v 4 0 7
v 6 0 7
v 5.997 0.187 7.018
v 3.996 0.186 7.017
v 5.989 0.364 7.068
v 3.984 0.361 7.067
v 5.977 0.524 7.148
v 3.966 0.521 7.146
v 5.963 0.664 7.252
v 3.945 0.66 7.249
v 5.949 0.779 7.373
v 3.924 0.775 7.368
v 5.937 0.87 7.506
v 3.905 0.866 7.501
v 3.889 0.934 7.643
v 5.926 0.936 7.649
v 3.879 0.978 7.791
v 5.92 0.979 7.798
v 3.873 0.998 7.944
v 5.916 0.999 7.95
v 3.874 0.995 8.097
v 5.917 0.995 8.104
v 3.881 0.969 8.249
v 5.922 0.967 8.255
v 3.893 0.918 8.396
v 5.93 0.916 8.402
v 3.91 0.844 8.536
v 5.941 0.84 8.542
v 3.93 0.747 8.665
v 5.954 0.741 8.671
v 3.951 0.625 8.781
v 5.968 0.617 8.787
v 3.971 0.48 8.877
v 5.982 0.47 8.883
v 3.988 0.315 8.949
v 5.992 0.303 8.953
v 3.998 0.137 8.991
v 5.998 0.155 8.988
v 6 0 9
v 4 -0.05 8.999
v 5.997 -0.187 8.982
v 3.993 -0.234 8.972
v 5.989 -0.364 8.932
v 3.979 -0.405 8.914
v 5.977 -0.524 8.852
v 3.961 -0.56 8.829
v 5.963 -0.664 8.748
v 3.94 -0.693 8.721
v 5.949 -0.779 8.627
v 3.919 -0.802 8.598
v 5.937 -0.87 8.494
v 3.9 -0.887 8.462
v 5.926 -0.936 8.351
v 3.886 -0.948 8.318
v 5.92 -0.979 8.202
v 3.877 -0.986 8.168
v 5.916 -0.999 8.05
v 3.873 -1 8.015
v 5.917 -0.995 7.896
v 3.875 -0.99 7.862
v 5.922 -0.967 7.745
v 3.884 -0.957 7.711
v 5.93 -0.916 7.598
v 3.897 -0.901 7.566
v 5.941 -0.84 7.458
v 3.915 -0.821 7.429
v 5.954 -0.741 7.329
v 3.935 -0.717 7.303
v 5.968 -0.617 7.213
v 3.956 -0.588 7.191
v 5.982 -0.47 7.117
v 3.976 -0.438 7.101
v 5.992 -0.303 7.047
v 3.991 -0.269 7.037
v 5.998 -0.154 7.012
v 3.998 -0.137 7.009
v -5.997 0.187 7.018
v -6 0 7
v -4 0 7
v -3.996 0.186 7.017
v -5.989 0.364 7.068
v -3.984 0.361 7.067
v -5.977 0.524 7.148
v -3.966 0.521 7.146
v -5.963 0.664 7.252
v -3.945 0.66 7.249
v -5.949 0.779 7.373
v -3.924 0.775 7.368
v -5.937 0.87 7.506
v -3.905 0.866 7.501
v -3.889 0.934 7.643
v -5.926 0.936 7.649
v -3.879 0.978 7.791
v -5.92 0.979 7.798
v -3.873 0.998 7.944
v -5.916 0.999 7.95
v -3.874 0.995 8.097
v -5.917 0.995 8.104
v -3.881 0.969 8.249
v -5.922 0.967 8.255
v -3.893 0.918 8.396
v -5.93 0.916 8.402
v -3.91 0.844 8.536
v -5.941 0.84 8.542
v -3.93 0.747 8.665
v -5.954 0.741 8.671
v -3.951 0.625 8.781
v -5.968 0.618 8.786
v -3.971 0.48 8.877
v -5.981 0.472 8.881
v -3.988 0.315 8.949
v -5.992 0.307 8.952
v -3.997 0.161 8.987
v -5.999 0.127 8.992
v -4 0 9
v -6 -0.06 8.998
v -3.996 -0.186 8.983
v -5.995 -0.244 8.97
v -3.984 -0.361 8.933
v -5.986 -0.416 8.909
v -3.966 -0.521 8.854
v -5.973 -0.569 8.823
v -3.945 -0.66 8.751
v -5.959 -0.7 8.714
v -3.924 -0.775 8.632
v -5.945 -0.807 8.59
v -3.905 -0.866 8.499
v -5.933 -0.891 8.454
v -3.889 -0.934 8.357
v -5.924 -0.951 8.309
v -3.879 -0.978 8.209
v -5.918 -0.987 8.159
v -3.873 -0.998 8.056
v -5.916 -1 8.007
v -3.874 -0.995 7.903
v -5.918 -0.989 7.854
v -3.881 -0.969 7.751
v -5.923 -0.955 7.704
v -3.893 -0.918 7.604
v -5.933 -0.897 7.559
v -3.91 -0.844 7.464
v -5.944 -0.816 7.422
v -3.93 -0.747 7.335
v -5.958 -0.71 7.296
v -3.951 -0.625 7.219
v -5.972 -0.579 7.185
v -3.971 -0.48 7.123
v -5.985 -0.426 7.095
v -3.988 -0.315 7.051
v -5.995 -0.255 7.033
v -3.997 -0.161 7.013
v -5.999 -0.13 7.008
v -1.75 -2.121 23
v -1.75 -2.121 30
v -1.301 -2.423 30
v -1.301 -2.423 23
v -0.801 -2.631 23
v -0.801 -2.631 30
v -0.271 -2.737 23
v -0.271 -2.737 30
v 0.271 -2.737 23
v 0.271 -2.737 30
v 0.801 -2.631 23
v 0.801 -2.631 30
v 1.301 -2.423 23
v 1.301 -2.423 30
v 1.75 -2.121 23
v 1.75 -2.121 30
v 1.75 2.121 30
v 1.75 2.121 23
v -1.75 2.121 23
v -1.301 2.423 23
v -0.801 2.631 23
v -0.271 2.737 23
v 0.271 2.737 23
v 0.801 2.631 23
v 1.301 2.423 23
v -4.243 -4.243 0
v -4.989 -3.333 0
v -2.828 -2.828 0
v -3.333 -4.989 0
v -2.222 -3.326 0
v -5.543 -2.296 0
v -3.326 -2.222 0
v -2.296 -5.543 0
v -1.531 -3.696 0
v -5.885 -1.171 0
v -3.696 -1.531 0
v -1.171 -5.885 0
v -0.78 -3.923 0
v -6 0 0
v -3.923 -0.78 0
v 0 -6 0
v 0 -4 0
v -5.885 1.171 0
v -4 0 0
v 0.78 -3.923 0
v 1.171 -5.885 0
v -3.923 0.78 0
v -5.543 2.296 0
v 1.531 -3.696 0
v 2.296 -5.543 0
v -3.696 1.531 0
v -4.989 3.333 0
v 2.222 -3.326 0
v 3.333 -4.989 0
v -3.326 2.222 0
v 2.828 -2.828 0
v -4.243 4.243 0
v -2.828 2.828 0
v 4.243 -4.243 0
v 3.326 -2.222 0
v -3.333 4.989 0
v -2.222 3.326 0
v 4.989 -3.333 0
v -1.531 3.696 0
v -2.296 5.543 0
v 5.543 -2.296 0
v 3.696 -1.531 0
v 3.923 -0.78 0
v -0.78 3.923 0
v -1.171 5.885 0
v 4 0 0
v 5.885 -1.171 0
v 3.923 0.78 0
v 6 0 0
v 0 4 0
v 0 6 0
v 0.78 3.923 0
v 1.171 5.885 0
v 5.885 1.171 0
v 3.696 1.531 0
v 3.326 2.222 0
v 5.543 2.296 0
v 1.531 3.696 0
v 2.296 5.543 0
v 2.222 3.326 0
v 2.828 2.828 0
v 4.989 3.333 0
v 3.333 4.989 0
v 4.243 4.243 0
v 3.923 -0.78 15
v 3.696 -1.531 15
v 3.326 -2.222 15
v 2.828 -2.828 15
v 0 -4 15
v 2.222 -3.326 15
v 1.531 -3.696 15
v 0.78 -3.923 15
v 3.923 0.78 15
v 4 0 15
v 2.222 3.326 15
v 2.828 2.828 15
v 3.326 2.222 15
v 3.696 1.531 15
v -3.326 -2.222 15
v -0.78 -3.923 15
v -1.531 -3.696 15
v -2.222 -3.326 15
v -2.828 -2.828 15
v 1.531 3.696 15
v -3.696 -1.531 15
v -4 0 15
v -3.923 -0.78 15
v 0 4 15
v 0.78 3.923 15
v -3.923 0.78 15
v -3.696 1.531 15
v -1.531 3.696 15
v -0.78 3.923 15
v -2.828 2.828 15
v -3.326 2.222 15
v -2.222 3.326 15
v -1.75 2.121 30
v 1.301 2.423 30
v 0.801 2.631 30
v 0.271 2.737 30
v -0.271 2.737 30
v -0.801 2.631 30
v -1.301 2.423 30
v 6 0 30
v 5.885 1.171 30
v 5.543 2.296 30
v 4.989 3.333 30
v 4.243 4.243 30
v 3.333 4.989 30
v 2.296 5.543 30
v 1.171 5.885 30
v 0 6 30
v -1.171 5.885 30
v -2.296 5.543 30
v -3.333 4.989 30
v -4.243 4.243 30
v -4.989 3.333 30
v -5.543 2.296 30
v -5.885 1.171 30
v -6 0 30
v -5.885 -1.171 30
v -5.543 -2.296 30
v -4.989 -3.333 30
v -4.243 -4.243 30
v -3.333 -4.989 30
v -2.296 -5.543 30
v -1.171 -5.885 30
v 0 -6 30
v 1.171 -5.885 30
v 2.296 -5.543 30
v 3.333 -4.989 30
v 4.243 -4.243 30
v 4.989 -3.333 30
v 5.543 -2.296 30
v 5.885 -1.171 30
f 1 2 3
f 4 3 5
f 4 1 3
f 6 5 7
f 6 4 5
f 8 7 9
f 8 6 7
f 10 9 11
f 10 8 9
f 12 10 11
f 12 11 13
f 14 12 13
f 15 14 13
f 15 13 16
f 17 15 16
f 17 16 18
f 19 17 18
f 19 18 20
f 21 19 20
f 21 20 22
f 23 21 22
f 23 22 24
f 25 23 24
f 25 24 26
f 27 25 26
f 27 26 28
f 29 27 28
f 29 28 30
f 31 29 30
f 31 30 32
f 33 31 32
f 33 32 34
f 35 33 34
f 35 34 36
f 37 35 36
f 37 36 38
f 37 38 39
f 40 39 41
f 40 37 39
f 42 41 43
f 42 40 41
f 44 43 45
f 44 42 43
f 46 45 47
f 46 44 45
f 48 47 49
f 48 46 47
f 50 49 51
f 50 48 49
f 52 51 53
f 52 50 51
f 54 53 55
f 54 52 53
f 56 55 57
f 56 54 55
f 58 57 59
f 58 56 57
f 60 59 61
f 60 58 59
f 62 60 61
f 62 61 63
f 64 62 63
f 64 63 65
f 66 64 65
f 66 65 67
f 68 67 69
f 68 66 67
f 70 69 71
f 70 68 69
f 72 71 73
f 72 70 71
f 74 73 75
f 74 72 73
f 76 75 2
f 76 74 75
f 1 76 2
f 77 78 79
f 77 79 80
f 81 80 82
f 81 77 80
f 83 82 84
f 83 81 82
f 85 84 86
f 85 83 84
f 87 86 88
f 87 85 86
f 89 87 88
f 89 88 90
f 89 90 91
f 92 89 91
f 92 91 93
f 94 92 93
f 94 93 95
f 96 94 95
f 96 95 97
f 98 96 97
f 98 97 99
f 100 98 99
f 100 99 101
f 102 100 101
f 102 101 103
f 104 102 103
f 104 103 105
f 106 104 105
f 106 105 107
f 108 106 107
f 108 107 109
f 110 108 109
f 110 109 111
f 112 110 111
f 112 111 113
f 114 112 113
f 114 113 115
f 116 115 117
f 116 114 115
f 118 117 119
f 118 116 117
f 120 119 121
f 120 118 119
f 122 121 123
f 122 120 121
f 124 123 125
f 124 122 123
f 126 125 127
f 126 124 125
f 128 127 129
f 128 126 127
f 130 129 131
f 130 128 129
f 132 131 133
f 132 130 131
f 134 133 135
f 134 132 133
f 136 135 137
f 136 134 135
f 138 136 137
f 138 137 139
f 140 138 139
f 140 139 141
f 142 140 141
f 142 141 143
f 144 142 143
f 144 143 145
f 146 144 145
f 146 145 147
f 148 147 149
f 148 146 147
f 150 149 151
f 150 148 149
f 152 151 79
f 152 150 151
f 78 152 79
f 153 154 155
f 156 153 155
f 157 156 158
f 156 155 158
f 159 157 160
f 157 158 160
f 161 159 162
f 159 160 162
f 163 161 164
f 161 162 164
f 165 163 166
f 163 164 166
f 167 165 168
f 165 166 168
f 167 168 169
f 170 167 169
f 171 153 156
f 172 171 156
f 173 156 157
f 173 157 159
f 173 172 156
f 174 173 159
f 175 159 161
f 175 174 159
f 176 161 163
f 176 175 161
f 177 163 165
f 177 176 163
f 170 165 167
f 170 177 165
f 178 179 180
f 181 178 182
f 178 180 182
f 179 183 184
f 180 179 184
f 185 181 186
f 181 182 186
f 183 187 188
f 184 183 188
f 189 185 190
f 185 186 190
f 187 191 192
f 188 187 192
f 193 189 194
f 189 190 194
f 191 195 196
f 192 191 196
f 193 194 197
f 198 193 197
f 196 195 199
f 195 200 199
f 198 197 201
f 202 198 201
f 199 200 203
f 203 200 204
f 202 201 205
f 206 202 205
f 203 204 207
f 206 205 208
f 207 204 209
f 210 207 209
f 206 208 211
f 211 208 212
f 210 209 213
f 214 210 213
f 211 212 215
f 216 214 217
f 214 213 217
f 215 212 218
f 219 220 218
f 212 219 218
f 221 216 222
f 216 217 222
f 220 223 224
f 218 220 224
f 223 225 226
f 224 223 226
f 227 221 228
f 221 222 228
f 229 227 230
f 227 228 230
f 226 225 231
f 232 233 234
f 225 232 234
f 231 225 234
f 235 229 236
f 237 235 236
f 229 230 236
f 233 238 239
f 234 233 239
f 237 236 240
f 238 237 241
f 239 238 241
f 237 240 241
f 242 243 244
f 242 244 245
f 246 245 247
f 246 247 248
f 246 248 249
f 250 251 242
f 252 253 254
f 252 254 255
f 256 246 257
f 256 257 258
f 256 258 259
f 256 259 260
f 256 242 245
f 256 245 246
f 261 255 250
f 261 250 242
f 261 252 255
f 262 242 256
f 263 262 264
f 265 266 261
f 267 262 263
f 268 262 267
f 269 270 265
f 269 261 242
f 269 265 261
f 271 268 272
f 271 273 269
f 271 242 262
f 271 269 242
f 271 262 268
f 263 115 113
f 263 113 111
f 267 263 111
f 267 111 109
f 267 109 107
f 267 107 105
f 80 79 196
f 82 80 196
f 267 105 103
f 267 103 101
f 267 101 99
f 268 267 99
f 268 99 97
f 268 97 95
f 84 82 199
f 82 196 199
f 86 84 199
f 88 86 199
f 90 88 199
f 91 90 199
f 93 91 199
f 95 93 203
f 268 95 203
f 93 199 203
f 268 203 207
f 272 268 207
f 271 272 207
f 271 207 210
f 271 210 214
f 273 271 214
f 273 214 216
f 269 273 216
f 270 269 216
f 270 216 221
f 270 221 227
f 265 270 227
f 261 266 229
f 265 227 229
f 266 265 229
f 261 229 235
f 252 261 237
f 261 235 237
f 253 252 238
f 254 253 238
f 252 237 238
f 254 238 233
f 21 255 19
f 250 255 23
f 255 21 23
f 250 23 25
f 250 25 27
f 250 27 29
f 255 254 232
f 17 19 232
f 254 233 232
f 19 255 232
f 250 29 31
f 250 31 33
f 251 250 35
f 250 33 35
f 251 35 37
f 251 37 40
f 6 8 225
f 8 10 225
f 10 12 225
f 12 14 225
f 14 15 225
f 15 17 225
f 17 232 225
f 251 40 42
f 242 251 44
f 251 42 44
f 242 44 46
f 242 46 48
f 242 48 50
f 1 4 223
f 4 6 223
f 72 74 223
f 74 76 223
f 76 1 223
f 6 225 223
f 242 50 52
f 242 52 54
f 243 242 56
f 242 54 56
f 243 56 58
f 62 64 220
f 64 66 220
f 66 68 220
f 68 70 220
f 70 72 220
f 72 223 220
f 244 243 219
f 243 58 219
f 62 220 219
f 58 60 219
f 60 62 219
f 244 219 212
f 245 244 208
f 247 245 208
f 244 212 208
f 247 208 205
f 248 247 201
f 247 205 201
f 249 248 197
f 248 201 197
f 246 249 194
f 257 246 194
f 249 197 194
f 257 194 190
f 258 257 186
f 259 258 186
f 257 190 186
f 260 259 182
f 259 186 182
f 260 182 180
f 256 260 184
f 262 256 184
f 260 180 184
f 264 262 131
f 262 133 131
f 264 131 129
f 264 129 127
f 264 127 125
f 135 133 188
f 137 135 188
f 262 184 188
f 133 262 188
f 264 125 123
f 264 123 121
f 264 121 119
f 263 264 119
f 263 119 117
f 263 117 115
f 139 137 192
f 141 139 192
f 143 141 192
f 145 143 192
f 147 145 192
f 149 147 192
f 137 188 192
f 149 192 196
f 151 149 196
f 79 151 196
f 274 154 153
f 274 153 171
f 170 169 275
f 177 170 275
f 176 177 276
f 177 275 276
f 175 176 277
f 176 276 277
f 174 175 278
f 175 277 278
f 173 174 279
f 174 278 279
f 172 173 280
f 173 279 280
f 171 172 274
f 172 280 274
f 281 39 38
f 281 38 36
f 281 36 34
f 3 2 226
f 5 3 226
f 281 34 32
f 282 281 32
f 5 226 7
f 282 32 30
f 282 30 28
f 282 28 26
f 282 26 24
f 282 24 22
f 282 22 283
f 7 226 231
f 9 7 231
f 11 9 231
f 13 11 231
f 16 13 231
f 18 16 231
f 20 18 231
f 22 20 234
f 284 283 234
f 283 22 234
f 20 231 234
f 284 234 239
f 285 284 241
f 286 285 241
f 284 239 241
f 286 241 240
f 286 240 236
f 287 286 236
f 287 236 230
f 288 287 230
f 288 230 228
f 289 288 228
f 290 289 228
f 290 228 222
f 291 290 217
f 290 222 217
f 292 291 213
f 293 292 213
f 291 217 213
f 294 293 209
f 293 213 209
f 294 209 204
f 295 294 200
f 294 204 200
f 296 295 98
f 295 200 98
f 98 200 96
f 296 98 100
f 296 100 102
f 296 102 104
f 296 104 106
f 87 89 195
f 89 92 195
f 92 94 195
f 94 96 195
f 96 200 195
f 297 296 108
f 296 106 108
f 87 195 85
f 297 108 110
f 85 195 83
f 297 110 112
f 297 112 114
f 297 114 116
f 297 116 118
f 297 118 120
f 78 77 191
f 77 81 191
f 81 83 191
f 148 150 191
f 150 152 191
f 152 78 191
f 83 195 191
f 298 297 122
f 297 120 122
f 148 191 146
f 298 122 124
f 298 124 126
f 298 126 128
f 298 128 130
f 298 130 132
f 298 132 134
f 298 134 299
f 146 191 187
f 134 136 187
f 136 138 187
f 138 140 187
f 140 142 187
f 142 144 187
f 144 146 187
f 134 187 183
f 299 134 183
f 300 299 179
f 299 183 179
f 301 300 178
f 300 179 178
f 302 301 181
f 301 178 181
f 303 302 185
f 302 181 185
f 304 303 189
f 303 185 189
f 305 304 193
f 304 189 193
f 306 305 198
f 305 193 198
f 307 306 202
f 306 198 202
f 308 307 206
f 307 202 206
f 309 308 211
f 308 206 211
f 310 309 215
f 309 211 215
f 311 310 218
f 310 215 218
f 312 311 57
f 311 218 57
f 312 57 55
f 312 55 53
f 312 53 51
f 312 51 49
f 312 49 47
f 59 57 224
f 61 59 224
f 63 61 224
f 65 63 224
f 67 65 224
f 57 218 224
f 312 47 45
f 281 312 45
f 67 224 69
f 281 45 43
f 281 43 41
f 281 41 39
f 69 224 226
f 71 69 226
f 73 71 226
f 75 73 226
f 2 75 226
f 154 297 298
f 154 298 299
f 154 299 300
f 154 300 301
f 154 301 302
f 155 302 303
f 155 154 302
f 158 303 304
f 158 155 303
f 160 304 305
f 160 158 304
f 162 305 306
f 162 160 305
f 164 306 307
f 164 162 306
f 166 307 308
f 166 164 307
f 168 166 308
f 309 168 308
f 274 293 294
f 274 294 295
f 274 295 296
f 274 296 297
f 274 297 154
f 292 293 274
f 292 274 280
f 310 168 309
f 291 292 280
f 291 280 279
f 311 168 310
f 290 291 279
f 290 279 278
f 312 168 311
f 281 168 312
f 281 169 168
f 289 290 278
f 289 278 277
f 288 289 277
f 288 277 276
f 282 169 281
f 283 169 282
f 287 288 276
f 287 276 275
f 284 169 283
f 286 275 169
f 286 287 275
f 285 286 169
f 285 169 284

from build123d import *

# Parameters (mm, degrees)
CROQUIS1_R                 = 6
SALIENTE_EXTRUIR1_DEPTH    = 30
CROQUIS2_R                 = 4
CORTAR_EXTRUIR1_DEPTH      = 15
CROQUIS3_W                 = 3.5
CROQUIS3_H                 = 4.242640688
CORTAR_EXTRUIR2_DEPTH      = 7
CORTAR_EXTRUIR3_DEPTH      = 32.176914536
CORTAR_EXTRUIR3_DEPTH_BACK = 32.176914536
CROQUIS4_R                 = 1


with BuildPart() as part:
    # Croquis1 → Saliente-Extruir1 (new body)
    with BuildSketch(Plane.XY):
        Circle(CROQUIS1_R)
    extrude(amount=SALIENTE_EXTRUIR1_DEPTH)

    # Croquis2 → Cortar-Extruir1 (cut)
    with BuildSketch(Plane(origin=(0, 0, 0), x_dir=(-1, 0, 0), z_dir=(0, 0, -1))):
        Circle(CROQUIS2_R)
    extrude(amount=-CORTAR_EXTRUIR1_DEPTH, mode=Mode.SUBTRACT)

    # Croquis3 → Cortar-Extruir2 (cut)
    with BuildSketch(Plane.XY.offset(30)):
        Rectangle(CROQUIS3_W, CROQUIS3_H)
        with BuildLine():
            ThreePointArc((1.75, 2.121320344), (0, 2.75), (-1.75, 2.121320344))
            Line((-1.75, 2.121320344), (1.75, 2.121320344))
        make_face()
        with BuildLine():
            Line((1.75, -2.121320344), (-1.75, -2.121320344))
            ThreePointArc((-1.75, -2.121320344), (0, -2.75), (1.75, -2.121320344))
        make_face()
    extrude(amount=-CORTAR_EXTRUIR2_DEPTH, mode=Mode.SUBTRACT)

    # Croquis4 → Cortar-Extruir3 (cut, two sides: drawn at the far end of the back side and taken through both)
    with BuildSketch(Plane(origin=(0, 0, 0), x_dir=(0, 0, -1), z_dir=(1, 0, 0)).offset(-CORTAR_EXTRUIR3_DEPTH_BACK)):
        with Locations((-8, 0)):
            Circle(CROQUIS4_R)
    extrude(amount=CORTAR_EXTRUIR3_DEPTH + CORTAR_EXTRUIR3_DEPTH_BACK, mode=Mode.SUBTRACT)


solid = part.part
